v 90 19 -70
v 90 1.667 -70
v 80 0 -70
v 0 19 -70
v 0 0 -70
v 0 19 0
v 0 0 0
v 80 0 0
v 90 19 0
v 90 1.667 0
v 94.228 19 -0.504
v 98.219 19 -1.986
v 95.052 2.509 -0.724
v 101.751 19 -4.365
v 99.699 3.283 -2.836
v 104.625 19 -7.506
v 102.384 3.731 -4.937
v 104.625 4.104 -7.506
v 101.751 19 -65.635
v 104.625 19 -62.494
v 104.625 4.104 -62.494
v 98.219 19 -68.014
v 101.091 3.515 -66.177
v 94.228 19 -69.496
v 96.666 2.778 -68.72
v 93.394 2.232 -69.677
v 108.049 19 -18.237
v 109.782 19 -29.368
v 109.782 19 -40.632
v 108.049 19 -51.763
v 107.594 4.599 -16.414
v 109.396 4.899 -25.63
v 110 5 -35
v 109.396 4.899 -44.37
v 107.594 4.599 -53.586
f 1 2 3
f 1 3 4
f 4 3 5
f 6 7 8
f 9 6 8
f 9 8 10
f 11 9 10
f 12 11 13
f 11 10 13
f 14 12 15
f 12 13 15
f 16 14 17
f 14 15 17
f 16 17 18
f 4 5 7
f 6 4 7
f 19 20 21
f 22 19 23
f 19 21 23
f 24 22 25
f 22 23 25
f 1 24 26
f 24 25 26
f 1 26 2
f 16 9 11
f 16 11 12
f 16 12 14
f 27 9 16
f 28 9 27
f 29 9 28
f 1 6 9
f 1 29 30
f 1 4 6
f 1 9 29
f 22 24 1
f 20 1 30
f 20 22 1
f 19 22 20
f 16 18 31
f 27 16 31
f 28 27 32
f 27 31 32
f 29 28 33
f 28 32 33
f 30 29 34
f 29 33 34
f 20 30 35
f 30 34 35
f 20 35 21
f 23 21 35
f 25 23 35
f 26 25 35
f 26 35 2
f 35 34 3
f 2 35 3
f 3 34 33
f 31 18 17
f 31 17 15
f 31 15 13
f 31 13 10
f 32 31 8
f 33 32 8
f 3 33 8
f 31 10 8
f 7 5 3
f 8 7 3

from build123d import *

# Parameters (mm, degrees)
BOSS_EXTRUDE1_DEPTH = 19
CUT_EXTRUDE1_DEPTH  = 70


with BuildPart() as part:
    # Sketch1 → Boss-Extrude1 (new body)
    with BuildSketch(Plane(origin=(0, 0, 0), x_dir=(1, 0, 0), z_dir=(0, 1, 0))):
        with BuildLine():
            Line((0, 0), (90, 0))
            ThreePointArc((90, 0), (98.219216869, 1.986116209), (104.624620421, 7.506169549))
            ThreePointArc((104.624620421, 7.506169549), (110, 35), (104.624620421, 62.493830451))
            ThreePointArc((104.624620421, 62.493830451), (98.219216869, 68.013883791), (90, 70))
            Line((90, 70), (0, 70))
            Line((0, 70), (0, 0))
        make_face()
    extrude(amount=BOSS_EXTRUDE1_DEPTH)

    # Sketch3 → Cut-Extrude1 (cut)
    with BuildSketch(Plane.XY):
        Polygon((110, 5), (80, 0), (110, 0), align=None)
    extrude(amount=-CUT_EXTRUDE1_DEPTH, mode=Mode.SUBTRACT)


solid = part.part
